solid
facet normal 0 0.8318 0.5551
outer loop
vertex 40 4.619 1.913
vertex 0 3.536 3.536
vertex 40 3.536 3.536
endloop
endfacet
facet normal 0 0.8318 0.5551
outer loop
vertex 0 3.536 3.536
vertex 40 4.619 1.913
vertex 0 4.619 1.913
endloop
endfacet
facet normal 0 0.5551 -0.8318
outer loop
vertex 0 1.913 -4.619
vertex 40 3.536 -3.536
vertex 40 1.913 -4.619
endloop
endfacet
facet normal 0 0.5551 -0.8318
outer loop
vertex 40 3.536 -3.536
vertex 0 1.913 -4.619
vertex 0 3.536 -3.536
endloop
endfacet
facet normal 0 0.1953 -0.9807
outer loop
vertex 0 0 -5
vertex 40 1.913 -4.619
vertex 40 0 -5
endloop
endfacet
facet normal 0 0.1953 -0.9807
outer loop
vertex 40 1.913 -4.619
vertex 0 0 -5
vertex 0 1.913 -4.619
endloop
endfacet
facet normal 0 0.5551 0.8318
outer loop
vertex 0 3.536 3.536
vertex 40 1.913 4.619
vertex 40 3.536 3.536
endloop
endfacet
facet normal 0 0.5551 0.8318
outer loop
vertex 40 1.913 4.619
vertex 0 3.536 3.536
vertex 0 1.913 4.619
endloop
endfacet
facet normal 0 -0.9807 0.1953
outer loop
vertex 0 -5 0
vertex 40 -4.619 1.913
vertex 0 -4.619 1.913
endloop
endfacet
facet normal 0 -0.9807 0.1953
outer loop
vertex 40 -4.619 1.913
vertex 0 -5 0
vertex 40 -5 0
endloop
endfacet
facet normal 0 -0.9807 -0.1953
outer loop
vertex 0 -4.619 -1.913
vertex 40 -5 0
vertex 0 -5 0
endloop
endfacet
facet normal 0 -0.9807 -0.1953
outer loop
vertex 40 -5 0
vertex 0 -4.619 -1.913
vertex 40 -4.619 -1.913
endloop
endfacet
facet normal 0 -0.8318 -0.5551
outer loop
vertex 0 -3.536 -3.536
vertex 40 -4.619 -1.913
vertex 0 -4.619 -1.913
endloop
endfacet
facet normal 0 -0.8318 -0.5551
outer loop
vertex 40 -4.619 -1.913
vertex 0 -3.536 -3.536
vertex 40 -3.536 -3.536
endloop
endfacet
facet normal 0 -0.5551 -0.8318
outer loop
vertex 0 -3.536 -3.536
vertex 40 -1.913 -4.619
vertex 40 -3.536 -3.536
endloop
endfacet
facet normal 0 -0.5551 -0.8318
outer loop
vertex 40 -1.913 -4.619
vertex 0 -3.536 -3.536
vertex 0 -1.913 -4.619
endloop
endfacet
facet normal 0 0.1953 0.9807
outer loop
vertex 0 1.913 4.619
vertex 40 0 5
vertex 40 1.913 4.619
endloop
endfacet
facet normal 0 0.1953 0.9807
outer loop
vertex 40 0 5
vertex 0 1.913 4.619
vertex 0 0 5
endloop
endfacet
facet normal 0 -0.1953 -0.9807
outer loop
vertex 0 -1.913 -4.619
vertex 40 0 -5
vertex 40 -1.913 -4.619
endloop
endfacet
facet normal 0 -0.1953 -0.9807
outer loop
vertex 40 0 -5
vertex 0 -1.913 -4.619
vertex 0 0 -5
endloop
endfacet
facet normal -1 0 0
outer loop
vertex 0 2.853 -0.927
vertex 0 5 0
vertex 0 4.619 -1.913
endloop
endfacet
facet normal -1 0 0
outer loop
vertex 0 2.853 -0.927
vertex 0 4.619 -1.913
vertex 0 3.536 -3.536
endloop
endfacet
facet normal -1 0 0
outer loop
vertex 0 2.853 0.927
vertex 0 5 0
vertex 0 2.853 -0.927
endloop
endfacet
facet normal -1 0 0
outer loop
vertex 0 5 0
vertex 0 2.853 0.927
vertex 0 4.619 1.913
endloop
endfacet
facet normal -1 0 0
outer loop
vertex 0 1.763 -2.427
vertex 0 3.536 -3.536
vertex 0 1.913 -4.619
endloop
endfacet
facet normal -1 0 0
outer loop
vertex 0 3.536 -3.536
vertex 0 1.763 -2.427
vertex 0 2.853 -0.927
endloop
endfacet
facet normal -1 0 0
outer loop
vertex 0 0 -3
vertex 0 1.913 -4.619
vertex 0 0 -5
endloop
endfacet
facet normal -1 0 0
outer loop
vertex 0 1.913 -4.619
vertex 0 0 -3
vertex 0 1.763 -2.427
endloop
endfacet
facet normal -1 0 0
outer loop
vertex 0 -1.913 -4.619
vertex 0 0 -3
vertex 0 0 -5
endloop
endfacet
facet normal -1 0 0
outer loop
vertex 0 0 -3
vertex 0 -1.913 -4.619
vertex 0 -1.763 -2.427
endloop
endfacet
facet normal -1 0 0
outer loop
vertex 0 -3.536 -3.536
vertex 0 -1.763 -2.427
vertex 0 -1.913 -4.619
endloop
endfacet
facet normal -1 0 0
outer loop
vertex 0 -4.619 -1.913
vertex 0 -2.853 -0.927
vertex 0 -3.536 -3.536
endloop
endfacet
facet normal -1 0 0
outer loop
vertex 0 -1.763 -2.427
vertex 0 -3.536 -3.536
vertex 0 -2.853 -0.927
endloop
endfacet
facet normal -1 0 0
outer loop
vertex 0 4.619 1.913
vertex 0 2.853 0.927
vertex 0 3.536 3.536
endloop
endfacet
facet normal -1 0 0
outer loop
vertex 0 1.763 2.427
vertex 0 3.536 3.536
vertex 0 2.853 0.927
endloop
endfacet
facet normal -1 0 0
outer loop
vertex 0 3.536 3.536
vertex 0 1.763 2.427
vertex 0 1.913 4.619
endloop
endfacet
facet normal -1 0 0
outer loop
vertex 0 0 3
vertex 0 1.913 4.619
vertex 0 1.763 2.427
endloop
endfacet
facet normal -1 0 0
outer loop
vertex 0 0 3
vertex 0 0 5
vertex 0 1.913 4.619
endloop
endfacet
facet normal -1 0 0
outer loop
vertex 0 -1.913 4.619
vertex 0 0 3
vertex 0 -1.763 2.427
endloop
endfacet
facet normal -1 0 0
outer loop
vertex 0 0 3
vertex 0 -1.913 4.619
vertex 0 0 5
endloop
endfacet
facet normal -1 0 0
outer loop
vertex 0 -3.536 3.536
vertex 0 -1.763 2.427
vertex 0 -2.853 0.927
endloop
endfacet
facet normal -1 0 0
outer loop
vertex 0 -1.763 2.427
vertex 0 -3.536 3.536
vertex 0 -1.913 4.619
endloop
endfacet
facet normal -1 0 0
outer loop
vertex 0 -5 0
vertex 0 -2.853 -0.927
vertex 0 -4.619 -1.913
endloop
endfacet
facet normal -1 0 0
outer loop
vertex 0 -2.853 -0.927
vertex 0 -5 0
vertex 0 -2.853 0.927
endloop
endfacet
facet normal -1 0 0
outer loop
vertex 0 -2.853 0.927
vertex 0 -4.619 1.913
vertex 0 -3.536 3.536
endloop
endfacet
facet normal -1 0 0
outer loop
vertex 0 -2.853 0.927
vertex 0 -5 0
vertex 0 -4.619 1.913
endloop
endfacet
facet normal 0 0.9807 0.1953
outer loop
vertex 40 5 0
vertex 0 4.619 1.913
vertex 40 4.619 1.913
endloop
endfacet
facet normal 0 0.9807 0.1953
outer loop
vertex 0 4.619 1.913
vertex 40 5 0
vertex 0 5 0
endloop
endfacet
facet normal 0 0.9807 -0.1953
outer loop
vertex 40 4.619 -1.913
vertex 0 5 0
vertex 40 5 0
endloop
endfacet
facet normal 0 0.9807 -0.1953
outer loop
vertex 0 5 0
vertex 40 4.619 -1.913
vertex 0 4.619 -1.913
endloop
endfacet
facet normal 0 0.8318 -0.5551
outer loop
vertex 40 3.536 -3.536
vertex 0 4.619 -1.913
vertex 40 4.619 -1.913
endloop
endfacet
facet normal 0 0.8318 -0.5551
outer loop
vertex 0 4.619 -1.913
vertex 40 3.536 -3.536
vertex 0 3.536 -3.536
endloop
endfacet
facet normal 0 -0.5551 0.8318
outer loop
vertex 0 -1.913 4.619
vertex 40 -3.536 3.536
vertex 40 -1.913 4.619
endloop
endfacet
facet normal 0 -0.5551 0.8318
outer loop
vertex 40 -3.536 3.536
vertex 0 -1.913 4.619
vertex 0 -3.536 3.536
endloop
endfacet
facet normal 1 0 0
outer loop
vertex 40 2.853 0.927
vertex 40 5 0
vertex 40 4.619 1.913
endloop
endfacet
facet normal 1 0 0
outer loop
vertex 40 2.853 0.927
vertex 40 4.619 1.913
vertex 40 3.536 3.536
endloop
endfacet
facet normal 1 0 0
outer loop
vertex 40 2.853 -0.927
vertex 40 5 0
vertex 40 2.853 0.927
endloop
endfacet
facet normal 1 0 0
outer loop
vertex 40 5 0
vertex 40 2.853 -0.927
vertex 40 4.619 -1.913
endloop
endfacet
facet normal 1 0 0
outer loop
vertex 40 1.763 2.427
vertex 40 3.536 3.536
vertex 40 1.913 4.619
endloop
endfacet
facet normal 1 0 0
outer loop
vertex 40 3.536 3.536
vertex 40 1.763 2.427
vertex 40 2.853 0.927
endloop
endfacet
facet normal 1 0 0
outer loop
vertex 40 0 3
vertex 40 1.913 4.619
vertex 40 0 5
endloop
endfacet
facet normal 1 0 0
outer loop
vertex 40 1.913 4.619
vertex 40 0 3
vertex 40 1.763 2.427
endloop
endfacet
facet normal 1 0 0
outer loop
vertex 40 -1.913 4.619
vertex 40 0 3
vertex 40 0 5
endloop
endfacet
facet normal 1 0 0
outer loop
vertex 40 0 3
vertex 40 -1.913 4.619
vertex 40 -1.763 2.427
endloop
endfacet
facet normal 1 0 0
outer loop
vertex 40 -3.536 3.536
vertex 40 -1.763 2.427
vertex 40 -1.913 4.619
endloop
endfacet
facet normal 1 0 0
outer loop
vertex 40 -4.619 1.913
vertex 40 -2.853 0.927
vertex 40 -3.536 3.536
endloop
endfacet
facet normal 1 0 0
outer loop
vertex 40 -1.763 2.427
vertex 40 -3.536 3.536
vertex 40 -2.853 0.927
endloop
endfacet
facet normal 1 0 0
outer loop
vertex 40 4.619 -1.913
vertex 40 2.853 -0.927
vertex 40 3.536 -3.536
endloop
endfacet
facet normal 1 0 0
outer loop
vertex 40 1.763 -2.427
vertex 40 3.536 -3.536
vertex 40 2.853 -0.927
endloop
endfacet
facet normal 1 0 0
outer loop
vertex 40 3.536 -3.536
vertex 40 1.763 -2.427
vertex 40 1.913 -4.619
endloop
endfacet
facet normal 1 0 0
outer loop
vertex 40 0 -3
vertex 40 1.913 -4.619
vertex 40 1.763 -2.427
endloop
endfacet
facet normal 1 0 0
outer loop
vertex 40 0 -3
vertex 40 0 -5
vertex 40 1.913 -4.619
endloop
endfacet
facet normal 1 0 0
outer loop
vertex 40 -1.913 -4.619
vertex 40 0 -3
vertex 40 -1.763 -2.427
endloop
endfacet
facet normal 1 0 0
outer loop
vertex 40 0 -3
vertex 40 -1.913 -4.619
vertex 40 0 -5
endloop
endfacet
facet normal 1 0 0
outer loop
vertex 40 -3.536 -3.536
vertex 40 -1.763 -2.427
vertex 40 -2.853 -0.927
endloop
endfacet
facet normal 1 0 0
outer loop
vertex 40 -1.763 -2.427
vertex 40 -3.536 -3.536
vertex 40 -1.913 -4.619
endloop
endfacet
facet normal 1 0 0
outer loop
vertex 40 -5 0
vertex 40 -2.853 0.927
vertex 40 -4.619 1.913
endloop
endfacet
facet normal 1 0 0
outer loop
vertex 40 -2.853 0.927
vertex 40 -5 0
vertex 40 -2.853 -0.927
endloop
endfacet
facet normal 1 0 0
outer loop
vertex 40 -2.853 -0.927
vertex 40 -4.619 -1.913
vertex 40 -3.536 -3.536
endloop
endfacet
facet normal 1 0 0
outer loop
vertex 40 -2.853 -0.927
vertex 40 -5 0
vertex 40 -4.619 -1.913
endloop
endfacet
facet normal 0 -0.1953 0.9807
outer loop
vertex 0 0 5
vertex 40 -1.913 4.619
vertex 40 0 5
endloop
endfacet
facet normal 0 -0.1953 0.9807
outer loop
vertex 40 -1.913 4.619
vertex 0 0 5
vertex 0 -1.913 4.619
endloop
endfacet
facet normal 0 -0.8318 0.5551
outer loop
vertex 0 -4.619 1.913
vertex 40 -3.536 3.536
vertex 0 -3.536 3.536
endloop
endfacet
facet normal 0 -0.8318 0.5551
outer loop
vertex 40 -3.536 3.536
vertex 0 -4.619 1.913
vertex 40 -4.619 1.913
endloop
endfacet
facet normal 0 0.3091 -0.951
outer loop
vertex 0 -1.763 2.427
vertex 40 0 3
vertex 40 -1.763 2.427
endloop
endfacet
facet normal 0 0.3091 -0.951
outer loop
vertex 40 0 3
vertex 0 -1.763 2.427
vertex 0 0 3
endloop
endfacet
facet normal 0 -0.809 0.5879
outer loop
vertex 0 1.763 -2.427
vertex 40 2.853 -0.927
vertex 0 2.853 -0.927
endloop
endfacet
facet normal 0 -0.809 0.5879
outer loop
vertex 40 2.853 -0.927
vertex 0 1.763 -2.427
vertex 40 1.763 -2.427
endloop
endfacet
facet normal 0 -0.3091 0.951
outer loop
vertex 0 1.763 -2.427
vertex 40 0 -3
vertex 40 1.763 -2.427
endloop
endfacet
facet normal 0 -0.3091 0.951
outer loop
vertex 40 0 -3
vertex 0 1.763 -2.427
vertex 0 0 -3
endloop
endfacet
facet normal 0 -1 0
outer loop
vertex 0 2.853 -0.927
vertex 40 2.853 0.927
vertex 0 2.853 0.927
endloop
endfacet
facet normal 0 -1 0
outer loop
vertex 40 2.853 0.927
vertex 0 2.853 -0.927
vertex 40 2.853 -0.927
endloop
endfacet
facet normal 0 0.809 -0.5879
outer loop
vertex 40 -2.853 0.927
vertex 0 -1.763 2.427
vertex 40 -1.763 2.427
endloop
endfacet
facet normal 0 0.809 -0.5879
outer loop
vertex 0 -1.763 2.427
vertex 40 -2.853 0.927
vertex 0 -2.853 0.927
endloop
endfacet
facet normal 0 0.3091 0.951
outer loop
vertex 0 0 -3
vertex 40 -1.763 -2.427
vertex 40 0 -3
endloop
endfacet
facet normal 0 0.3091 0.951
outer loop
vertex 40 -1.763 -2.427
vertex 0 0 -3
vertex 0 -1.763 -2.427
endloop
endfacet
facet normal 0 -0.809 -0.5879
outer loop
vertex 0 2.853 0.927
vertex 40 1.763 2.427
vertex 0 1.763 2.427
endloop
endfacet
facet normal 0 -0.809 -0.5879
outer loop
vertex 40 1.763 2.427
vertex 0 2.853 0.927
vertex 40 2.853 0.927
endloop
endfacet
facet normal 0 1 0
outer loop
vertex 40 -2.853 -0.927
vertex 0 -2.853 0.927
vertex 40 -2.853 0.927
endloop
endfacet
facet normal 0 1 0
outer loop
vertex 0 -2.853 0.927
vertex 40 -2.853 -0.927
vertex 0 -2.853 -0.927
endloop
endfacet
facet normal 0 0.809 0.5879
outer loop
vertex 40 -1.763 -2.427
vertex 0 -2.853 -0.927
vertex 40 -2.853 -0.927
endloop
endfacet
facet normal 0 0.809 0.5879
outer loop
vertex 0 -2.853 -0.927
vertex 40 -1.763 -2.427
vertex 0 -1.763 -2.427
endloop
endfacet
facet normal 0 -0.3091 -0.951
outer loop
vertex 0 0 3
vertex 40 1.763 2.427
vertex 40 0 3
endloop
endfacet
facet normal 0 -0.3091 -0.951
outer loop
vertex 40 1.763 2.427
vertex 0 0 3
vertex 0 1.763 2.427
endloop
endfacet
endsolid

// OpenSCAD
rotate( [0, 90, 0])
{
    difference() {
        cylinder(h = 40, r = 5);
            cylinder(h = 42, r = 3);
    }
}
